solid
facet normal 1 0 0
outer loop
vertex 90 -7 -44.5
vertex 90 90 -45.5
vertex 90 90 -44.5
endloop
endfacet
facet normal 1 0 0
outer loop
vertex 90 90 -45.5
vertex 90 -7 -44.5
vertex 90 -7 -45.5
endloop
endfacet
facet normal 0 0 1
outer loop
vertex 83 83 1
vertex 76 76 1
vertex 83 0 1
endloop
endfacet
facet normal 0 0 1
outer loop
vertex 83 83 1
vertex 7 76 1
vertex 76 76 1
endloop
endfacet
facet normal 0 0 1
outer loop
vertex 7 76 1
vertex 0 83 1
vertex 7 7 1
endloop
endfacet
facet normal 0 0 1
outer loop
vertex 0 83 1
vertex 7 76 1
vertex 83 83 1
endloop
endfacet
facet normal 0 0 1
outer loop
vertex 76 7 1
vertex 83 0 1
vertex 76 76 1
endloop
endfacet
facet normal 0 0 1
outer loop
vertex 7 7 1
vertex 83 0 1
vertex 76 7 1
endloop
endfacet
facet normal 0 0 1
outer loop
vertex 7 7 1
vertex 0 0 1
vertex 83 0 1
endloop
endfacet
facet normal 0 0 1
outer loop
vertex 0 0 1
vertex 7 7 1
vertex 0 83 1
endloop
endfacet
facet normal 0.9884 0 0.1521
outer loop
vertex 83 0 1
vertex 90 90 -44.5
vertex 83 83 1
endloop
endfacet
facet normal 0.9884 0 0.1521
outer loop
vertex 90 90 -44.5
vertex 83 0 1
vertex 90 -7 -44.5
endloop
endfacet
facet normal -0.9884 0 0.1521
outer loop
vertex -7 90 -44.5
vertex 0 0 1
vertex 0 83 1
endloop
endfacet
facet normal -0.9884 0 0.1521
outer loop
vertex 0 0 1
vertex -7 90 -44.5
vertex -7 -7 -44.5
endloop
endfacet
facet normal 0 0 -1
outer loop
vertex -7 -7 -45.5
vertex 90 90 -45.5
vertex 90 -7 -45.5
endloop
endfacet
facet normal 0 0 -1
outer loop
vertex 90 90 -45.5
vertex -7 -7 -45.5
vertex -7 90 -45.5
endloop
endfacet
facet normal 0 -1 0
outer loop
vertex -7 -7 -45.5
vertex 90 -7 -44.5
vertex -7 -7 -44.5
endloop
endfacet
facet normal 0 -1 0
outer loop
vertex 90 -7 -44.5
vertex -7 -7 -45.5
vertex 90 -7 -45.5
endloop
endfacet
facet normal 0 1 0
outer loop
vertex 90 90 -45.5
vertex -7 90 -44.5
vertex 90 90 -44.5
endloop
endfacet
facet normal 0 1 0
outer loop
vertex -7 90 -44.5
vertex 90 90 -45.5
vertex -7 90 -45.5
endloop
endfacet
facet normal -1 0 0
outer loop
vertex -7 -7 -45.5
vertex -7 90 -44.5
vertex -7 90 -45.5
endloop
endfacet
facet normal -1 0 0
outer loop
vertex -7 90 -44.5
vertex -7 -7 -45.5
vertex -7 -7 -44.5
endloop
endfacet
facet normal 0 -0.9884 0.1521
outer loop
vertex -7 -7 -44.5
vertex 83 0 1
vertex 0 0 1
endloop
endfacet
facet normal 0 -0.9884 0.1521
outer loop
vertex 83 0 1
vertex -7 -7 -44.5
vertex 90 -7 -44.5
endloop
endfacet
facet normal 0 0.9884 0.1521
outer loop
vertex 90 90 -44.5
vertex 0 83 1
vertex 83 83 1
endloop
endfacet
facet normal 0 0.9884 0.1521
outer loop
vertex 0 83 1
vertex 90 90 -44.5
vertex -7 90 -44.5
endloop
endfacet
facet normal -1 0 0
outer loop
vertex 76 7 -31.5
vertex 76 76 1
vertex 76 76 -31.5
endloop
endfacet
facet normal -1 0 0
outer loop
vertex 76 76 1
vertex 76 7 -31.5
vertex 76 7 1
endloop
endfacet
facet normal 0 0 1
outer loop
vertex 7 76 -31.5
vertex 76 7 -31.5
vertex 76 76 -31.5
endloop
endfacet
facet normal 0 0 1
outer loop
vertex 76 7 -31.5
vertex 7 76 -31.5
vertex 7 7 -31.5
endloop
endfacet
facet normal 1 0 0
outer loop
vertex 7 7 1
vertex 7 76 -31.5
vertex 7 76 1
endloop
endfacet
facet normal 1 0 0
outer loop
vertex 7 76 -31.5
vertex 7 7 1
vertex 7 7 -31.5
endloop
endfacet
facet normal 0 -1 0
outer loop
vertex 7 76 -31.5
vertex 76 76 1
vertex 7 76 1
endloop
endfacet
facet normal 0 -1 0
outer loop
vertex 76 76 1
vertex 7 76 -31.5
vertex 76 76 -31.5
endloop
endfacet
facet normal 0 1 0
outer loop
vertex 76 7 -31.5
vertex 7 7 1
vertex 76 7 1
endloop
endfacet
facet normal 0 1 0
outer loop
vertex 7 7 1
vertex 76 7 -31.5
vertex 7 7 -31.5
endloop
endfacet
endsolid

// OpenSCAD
leg_width = 63;
leg_depth = 63;

riser_height = 14;
padding_height = 2;

interior_padding = 3;

leg_container_height = (leg_width + leg_depth) / 4;
wall_thickness = riser_height / 2;
bottom_width = leg_width + riser_height;
bottom_depth = leg_depth + riser_height;

difference() {
  hull() {
    cube([
      leg_width + interior_padding * 2 + wall_thickness * 2,
      leg_depth + interior_padding * 2 + wall_thickness * 2,
      1
    ]);

    translate([-riser_height / 2, -riser_height / 2, -leg_container_height - riser_height]) {
      cube([
        bottom_width + interior_padding * 2 + wall_thickness * 2,
        bottom_depth + interior_padding * 2 + wall_thickness * 2,
        1
      ]);
    }
  }
  translate([wall_thickness, wall_thickness, -leg_container_height]) {
    #cube([leg_width + interior_padding * 2, leg_depth + interior_padding * 2, leg_container_height + 2]);
  }
}
